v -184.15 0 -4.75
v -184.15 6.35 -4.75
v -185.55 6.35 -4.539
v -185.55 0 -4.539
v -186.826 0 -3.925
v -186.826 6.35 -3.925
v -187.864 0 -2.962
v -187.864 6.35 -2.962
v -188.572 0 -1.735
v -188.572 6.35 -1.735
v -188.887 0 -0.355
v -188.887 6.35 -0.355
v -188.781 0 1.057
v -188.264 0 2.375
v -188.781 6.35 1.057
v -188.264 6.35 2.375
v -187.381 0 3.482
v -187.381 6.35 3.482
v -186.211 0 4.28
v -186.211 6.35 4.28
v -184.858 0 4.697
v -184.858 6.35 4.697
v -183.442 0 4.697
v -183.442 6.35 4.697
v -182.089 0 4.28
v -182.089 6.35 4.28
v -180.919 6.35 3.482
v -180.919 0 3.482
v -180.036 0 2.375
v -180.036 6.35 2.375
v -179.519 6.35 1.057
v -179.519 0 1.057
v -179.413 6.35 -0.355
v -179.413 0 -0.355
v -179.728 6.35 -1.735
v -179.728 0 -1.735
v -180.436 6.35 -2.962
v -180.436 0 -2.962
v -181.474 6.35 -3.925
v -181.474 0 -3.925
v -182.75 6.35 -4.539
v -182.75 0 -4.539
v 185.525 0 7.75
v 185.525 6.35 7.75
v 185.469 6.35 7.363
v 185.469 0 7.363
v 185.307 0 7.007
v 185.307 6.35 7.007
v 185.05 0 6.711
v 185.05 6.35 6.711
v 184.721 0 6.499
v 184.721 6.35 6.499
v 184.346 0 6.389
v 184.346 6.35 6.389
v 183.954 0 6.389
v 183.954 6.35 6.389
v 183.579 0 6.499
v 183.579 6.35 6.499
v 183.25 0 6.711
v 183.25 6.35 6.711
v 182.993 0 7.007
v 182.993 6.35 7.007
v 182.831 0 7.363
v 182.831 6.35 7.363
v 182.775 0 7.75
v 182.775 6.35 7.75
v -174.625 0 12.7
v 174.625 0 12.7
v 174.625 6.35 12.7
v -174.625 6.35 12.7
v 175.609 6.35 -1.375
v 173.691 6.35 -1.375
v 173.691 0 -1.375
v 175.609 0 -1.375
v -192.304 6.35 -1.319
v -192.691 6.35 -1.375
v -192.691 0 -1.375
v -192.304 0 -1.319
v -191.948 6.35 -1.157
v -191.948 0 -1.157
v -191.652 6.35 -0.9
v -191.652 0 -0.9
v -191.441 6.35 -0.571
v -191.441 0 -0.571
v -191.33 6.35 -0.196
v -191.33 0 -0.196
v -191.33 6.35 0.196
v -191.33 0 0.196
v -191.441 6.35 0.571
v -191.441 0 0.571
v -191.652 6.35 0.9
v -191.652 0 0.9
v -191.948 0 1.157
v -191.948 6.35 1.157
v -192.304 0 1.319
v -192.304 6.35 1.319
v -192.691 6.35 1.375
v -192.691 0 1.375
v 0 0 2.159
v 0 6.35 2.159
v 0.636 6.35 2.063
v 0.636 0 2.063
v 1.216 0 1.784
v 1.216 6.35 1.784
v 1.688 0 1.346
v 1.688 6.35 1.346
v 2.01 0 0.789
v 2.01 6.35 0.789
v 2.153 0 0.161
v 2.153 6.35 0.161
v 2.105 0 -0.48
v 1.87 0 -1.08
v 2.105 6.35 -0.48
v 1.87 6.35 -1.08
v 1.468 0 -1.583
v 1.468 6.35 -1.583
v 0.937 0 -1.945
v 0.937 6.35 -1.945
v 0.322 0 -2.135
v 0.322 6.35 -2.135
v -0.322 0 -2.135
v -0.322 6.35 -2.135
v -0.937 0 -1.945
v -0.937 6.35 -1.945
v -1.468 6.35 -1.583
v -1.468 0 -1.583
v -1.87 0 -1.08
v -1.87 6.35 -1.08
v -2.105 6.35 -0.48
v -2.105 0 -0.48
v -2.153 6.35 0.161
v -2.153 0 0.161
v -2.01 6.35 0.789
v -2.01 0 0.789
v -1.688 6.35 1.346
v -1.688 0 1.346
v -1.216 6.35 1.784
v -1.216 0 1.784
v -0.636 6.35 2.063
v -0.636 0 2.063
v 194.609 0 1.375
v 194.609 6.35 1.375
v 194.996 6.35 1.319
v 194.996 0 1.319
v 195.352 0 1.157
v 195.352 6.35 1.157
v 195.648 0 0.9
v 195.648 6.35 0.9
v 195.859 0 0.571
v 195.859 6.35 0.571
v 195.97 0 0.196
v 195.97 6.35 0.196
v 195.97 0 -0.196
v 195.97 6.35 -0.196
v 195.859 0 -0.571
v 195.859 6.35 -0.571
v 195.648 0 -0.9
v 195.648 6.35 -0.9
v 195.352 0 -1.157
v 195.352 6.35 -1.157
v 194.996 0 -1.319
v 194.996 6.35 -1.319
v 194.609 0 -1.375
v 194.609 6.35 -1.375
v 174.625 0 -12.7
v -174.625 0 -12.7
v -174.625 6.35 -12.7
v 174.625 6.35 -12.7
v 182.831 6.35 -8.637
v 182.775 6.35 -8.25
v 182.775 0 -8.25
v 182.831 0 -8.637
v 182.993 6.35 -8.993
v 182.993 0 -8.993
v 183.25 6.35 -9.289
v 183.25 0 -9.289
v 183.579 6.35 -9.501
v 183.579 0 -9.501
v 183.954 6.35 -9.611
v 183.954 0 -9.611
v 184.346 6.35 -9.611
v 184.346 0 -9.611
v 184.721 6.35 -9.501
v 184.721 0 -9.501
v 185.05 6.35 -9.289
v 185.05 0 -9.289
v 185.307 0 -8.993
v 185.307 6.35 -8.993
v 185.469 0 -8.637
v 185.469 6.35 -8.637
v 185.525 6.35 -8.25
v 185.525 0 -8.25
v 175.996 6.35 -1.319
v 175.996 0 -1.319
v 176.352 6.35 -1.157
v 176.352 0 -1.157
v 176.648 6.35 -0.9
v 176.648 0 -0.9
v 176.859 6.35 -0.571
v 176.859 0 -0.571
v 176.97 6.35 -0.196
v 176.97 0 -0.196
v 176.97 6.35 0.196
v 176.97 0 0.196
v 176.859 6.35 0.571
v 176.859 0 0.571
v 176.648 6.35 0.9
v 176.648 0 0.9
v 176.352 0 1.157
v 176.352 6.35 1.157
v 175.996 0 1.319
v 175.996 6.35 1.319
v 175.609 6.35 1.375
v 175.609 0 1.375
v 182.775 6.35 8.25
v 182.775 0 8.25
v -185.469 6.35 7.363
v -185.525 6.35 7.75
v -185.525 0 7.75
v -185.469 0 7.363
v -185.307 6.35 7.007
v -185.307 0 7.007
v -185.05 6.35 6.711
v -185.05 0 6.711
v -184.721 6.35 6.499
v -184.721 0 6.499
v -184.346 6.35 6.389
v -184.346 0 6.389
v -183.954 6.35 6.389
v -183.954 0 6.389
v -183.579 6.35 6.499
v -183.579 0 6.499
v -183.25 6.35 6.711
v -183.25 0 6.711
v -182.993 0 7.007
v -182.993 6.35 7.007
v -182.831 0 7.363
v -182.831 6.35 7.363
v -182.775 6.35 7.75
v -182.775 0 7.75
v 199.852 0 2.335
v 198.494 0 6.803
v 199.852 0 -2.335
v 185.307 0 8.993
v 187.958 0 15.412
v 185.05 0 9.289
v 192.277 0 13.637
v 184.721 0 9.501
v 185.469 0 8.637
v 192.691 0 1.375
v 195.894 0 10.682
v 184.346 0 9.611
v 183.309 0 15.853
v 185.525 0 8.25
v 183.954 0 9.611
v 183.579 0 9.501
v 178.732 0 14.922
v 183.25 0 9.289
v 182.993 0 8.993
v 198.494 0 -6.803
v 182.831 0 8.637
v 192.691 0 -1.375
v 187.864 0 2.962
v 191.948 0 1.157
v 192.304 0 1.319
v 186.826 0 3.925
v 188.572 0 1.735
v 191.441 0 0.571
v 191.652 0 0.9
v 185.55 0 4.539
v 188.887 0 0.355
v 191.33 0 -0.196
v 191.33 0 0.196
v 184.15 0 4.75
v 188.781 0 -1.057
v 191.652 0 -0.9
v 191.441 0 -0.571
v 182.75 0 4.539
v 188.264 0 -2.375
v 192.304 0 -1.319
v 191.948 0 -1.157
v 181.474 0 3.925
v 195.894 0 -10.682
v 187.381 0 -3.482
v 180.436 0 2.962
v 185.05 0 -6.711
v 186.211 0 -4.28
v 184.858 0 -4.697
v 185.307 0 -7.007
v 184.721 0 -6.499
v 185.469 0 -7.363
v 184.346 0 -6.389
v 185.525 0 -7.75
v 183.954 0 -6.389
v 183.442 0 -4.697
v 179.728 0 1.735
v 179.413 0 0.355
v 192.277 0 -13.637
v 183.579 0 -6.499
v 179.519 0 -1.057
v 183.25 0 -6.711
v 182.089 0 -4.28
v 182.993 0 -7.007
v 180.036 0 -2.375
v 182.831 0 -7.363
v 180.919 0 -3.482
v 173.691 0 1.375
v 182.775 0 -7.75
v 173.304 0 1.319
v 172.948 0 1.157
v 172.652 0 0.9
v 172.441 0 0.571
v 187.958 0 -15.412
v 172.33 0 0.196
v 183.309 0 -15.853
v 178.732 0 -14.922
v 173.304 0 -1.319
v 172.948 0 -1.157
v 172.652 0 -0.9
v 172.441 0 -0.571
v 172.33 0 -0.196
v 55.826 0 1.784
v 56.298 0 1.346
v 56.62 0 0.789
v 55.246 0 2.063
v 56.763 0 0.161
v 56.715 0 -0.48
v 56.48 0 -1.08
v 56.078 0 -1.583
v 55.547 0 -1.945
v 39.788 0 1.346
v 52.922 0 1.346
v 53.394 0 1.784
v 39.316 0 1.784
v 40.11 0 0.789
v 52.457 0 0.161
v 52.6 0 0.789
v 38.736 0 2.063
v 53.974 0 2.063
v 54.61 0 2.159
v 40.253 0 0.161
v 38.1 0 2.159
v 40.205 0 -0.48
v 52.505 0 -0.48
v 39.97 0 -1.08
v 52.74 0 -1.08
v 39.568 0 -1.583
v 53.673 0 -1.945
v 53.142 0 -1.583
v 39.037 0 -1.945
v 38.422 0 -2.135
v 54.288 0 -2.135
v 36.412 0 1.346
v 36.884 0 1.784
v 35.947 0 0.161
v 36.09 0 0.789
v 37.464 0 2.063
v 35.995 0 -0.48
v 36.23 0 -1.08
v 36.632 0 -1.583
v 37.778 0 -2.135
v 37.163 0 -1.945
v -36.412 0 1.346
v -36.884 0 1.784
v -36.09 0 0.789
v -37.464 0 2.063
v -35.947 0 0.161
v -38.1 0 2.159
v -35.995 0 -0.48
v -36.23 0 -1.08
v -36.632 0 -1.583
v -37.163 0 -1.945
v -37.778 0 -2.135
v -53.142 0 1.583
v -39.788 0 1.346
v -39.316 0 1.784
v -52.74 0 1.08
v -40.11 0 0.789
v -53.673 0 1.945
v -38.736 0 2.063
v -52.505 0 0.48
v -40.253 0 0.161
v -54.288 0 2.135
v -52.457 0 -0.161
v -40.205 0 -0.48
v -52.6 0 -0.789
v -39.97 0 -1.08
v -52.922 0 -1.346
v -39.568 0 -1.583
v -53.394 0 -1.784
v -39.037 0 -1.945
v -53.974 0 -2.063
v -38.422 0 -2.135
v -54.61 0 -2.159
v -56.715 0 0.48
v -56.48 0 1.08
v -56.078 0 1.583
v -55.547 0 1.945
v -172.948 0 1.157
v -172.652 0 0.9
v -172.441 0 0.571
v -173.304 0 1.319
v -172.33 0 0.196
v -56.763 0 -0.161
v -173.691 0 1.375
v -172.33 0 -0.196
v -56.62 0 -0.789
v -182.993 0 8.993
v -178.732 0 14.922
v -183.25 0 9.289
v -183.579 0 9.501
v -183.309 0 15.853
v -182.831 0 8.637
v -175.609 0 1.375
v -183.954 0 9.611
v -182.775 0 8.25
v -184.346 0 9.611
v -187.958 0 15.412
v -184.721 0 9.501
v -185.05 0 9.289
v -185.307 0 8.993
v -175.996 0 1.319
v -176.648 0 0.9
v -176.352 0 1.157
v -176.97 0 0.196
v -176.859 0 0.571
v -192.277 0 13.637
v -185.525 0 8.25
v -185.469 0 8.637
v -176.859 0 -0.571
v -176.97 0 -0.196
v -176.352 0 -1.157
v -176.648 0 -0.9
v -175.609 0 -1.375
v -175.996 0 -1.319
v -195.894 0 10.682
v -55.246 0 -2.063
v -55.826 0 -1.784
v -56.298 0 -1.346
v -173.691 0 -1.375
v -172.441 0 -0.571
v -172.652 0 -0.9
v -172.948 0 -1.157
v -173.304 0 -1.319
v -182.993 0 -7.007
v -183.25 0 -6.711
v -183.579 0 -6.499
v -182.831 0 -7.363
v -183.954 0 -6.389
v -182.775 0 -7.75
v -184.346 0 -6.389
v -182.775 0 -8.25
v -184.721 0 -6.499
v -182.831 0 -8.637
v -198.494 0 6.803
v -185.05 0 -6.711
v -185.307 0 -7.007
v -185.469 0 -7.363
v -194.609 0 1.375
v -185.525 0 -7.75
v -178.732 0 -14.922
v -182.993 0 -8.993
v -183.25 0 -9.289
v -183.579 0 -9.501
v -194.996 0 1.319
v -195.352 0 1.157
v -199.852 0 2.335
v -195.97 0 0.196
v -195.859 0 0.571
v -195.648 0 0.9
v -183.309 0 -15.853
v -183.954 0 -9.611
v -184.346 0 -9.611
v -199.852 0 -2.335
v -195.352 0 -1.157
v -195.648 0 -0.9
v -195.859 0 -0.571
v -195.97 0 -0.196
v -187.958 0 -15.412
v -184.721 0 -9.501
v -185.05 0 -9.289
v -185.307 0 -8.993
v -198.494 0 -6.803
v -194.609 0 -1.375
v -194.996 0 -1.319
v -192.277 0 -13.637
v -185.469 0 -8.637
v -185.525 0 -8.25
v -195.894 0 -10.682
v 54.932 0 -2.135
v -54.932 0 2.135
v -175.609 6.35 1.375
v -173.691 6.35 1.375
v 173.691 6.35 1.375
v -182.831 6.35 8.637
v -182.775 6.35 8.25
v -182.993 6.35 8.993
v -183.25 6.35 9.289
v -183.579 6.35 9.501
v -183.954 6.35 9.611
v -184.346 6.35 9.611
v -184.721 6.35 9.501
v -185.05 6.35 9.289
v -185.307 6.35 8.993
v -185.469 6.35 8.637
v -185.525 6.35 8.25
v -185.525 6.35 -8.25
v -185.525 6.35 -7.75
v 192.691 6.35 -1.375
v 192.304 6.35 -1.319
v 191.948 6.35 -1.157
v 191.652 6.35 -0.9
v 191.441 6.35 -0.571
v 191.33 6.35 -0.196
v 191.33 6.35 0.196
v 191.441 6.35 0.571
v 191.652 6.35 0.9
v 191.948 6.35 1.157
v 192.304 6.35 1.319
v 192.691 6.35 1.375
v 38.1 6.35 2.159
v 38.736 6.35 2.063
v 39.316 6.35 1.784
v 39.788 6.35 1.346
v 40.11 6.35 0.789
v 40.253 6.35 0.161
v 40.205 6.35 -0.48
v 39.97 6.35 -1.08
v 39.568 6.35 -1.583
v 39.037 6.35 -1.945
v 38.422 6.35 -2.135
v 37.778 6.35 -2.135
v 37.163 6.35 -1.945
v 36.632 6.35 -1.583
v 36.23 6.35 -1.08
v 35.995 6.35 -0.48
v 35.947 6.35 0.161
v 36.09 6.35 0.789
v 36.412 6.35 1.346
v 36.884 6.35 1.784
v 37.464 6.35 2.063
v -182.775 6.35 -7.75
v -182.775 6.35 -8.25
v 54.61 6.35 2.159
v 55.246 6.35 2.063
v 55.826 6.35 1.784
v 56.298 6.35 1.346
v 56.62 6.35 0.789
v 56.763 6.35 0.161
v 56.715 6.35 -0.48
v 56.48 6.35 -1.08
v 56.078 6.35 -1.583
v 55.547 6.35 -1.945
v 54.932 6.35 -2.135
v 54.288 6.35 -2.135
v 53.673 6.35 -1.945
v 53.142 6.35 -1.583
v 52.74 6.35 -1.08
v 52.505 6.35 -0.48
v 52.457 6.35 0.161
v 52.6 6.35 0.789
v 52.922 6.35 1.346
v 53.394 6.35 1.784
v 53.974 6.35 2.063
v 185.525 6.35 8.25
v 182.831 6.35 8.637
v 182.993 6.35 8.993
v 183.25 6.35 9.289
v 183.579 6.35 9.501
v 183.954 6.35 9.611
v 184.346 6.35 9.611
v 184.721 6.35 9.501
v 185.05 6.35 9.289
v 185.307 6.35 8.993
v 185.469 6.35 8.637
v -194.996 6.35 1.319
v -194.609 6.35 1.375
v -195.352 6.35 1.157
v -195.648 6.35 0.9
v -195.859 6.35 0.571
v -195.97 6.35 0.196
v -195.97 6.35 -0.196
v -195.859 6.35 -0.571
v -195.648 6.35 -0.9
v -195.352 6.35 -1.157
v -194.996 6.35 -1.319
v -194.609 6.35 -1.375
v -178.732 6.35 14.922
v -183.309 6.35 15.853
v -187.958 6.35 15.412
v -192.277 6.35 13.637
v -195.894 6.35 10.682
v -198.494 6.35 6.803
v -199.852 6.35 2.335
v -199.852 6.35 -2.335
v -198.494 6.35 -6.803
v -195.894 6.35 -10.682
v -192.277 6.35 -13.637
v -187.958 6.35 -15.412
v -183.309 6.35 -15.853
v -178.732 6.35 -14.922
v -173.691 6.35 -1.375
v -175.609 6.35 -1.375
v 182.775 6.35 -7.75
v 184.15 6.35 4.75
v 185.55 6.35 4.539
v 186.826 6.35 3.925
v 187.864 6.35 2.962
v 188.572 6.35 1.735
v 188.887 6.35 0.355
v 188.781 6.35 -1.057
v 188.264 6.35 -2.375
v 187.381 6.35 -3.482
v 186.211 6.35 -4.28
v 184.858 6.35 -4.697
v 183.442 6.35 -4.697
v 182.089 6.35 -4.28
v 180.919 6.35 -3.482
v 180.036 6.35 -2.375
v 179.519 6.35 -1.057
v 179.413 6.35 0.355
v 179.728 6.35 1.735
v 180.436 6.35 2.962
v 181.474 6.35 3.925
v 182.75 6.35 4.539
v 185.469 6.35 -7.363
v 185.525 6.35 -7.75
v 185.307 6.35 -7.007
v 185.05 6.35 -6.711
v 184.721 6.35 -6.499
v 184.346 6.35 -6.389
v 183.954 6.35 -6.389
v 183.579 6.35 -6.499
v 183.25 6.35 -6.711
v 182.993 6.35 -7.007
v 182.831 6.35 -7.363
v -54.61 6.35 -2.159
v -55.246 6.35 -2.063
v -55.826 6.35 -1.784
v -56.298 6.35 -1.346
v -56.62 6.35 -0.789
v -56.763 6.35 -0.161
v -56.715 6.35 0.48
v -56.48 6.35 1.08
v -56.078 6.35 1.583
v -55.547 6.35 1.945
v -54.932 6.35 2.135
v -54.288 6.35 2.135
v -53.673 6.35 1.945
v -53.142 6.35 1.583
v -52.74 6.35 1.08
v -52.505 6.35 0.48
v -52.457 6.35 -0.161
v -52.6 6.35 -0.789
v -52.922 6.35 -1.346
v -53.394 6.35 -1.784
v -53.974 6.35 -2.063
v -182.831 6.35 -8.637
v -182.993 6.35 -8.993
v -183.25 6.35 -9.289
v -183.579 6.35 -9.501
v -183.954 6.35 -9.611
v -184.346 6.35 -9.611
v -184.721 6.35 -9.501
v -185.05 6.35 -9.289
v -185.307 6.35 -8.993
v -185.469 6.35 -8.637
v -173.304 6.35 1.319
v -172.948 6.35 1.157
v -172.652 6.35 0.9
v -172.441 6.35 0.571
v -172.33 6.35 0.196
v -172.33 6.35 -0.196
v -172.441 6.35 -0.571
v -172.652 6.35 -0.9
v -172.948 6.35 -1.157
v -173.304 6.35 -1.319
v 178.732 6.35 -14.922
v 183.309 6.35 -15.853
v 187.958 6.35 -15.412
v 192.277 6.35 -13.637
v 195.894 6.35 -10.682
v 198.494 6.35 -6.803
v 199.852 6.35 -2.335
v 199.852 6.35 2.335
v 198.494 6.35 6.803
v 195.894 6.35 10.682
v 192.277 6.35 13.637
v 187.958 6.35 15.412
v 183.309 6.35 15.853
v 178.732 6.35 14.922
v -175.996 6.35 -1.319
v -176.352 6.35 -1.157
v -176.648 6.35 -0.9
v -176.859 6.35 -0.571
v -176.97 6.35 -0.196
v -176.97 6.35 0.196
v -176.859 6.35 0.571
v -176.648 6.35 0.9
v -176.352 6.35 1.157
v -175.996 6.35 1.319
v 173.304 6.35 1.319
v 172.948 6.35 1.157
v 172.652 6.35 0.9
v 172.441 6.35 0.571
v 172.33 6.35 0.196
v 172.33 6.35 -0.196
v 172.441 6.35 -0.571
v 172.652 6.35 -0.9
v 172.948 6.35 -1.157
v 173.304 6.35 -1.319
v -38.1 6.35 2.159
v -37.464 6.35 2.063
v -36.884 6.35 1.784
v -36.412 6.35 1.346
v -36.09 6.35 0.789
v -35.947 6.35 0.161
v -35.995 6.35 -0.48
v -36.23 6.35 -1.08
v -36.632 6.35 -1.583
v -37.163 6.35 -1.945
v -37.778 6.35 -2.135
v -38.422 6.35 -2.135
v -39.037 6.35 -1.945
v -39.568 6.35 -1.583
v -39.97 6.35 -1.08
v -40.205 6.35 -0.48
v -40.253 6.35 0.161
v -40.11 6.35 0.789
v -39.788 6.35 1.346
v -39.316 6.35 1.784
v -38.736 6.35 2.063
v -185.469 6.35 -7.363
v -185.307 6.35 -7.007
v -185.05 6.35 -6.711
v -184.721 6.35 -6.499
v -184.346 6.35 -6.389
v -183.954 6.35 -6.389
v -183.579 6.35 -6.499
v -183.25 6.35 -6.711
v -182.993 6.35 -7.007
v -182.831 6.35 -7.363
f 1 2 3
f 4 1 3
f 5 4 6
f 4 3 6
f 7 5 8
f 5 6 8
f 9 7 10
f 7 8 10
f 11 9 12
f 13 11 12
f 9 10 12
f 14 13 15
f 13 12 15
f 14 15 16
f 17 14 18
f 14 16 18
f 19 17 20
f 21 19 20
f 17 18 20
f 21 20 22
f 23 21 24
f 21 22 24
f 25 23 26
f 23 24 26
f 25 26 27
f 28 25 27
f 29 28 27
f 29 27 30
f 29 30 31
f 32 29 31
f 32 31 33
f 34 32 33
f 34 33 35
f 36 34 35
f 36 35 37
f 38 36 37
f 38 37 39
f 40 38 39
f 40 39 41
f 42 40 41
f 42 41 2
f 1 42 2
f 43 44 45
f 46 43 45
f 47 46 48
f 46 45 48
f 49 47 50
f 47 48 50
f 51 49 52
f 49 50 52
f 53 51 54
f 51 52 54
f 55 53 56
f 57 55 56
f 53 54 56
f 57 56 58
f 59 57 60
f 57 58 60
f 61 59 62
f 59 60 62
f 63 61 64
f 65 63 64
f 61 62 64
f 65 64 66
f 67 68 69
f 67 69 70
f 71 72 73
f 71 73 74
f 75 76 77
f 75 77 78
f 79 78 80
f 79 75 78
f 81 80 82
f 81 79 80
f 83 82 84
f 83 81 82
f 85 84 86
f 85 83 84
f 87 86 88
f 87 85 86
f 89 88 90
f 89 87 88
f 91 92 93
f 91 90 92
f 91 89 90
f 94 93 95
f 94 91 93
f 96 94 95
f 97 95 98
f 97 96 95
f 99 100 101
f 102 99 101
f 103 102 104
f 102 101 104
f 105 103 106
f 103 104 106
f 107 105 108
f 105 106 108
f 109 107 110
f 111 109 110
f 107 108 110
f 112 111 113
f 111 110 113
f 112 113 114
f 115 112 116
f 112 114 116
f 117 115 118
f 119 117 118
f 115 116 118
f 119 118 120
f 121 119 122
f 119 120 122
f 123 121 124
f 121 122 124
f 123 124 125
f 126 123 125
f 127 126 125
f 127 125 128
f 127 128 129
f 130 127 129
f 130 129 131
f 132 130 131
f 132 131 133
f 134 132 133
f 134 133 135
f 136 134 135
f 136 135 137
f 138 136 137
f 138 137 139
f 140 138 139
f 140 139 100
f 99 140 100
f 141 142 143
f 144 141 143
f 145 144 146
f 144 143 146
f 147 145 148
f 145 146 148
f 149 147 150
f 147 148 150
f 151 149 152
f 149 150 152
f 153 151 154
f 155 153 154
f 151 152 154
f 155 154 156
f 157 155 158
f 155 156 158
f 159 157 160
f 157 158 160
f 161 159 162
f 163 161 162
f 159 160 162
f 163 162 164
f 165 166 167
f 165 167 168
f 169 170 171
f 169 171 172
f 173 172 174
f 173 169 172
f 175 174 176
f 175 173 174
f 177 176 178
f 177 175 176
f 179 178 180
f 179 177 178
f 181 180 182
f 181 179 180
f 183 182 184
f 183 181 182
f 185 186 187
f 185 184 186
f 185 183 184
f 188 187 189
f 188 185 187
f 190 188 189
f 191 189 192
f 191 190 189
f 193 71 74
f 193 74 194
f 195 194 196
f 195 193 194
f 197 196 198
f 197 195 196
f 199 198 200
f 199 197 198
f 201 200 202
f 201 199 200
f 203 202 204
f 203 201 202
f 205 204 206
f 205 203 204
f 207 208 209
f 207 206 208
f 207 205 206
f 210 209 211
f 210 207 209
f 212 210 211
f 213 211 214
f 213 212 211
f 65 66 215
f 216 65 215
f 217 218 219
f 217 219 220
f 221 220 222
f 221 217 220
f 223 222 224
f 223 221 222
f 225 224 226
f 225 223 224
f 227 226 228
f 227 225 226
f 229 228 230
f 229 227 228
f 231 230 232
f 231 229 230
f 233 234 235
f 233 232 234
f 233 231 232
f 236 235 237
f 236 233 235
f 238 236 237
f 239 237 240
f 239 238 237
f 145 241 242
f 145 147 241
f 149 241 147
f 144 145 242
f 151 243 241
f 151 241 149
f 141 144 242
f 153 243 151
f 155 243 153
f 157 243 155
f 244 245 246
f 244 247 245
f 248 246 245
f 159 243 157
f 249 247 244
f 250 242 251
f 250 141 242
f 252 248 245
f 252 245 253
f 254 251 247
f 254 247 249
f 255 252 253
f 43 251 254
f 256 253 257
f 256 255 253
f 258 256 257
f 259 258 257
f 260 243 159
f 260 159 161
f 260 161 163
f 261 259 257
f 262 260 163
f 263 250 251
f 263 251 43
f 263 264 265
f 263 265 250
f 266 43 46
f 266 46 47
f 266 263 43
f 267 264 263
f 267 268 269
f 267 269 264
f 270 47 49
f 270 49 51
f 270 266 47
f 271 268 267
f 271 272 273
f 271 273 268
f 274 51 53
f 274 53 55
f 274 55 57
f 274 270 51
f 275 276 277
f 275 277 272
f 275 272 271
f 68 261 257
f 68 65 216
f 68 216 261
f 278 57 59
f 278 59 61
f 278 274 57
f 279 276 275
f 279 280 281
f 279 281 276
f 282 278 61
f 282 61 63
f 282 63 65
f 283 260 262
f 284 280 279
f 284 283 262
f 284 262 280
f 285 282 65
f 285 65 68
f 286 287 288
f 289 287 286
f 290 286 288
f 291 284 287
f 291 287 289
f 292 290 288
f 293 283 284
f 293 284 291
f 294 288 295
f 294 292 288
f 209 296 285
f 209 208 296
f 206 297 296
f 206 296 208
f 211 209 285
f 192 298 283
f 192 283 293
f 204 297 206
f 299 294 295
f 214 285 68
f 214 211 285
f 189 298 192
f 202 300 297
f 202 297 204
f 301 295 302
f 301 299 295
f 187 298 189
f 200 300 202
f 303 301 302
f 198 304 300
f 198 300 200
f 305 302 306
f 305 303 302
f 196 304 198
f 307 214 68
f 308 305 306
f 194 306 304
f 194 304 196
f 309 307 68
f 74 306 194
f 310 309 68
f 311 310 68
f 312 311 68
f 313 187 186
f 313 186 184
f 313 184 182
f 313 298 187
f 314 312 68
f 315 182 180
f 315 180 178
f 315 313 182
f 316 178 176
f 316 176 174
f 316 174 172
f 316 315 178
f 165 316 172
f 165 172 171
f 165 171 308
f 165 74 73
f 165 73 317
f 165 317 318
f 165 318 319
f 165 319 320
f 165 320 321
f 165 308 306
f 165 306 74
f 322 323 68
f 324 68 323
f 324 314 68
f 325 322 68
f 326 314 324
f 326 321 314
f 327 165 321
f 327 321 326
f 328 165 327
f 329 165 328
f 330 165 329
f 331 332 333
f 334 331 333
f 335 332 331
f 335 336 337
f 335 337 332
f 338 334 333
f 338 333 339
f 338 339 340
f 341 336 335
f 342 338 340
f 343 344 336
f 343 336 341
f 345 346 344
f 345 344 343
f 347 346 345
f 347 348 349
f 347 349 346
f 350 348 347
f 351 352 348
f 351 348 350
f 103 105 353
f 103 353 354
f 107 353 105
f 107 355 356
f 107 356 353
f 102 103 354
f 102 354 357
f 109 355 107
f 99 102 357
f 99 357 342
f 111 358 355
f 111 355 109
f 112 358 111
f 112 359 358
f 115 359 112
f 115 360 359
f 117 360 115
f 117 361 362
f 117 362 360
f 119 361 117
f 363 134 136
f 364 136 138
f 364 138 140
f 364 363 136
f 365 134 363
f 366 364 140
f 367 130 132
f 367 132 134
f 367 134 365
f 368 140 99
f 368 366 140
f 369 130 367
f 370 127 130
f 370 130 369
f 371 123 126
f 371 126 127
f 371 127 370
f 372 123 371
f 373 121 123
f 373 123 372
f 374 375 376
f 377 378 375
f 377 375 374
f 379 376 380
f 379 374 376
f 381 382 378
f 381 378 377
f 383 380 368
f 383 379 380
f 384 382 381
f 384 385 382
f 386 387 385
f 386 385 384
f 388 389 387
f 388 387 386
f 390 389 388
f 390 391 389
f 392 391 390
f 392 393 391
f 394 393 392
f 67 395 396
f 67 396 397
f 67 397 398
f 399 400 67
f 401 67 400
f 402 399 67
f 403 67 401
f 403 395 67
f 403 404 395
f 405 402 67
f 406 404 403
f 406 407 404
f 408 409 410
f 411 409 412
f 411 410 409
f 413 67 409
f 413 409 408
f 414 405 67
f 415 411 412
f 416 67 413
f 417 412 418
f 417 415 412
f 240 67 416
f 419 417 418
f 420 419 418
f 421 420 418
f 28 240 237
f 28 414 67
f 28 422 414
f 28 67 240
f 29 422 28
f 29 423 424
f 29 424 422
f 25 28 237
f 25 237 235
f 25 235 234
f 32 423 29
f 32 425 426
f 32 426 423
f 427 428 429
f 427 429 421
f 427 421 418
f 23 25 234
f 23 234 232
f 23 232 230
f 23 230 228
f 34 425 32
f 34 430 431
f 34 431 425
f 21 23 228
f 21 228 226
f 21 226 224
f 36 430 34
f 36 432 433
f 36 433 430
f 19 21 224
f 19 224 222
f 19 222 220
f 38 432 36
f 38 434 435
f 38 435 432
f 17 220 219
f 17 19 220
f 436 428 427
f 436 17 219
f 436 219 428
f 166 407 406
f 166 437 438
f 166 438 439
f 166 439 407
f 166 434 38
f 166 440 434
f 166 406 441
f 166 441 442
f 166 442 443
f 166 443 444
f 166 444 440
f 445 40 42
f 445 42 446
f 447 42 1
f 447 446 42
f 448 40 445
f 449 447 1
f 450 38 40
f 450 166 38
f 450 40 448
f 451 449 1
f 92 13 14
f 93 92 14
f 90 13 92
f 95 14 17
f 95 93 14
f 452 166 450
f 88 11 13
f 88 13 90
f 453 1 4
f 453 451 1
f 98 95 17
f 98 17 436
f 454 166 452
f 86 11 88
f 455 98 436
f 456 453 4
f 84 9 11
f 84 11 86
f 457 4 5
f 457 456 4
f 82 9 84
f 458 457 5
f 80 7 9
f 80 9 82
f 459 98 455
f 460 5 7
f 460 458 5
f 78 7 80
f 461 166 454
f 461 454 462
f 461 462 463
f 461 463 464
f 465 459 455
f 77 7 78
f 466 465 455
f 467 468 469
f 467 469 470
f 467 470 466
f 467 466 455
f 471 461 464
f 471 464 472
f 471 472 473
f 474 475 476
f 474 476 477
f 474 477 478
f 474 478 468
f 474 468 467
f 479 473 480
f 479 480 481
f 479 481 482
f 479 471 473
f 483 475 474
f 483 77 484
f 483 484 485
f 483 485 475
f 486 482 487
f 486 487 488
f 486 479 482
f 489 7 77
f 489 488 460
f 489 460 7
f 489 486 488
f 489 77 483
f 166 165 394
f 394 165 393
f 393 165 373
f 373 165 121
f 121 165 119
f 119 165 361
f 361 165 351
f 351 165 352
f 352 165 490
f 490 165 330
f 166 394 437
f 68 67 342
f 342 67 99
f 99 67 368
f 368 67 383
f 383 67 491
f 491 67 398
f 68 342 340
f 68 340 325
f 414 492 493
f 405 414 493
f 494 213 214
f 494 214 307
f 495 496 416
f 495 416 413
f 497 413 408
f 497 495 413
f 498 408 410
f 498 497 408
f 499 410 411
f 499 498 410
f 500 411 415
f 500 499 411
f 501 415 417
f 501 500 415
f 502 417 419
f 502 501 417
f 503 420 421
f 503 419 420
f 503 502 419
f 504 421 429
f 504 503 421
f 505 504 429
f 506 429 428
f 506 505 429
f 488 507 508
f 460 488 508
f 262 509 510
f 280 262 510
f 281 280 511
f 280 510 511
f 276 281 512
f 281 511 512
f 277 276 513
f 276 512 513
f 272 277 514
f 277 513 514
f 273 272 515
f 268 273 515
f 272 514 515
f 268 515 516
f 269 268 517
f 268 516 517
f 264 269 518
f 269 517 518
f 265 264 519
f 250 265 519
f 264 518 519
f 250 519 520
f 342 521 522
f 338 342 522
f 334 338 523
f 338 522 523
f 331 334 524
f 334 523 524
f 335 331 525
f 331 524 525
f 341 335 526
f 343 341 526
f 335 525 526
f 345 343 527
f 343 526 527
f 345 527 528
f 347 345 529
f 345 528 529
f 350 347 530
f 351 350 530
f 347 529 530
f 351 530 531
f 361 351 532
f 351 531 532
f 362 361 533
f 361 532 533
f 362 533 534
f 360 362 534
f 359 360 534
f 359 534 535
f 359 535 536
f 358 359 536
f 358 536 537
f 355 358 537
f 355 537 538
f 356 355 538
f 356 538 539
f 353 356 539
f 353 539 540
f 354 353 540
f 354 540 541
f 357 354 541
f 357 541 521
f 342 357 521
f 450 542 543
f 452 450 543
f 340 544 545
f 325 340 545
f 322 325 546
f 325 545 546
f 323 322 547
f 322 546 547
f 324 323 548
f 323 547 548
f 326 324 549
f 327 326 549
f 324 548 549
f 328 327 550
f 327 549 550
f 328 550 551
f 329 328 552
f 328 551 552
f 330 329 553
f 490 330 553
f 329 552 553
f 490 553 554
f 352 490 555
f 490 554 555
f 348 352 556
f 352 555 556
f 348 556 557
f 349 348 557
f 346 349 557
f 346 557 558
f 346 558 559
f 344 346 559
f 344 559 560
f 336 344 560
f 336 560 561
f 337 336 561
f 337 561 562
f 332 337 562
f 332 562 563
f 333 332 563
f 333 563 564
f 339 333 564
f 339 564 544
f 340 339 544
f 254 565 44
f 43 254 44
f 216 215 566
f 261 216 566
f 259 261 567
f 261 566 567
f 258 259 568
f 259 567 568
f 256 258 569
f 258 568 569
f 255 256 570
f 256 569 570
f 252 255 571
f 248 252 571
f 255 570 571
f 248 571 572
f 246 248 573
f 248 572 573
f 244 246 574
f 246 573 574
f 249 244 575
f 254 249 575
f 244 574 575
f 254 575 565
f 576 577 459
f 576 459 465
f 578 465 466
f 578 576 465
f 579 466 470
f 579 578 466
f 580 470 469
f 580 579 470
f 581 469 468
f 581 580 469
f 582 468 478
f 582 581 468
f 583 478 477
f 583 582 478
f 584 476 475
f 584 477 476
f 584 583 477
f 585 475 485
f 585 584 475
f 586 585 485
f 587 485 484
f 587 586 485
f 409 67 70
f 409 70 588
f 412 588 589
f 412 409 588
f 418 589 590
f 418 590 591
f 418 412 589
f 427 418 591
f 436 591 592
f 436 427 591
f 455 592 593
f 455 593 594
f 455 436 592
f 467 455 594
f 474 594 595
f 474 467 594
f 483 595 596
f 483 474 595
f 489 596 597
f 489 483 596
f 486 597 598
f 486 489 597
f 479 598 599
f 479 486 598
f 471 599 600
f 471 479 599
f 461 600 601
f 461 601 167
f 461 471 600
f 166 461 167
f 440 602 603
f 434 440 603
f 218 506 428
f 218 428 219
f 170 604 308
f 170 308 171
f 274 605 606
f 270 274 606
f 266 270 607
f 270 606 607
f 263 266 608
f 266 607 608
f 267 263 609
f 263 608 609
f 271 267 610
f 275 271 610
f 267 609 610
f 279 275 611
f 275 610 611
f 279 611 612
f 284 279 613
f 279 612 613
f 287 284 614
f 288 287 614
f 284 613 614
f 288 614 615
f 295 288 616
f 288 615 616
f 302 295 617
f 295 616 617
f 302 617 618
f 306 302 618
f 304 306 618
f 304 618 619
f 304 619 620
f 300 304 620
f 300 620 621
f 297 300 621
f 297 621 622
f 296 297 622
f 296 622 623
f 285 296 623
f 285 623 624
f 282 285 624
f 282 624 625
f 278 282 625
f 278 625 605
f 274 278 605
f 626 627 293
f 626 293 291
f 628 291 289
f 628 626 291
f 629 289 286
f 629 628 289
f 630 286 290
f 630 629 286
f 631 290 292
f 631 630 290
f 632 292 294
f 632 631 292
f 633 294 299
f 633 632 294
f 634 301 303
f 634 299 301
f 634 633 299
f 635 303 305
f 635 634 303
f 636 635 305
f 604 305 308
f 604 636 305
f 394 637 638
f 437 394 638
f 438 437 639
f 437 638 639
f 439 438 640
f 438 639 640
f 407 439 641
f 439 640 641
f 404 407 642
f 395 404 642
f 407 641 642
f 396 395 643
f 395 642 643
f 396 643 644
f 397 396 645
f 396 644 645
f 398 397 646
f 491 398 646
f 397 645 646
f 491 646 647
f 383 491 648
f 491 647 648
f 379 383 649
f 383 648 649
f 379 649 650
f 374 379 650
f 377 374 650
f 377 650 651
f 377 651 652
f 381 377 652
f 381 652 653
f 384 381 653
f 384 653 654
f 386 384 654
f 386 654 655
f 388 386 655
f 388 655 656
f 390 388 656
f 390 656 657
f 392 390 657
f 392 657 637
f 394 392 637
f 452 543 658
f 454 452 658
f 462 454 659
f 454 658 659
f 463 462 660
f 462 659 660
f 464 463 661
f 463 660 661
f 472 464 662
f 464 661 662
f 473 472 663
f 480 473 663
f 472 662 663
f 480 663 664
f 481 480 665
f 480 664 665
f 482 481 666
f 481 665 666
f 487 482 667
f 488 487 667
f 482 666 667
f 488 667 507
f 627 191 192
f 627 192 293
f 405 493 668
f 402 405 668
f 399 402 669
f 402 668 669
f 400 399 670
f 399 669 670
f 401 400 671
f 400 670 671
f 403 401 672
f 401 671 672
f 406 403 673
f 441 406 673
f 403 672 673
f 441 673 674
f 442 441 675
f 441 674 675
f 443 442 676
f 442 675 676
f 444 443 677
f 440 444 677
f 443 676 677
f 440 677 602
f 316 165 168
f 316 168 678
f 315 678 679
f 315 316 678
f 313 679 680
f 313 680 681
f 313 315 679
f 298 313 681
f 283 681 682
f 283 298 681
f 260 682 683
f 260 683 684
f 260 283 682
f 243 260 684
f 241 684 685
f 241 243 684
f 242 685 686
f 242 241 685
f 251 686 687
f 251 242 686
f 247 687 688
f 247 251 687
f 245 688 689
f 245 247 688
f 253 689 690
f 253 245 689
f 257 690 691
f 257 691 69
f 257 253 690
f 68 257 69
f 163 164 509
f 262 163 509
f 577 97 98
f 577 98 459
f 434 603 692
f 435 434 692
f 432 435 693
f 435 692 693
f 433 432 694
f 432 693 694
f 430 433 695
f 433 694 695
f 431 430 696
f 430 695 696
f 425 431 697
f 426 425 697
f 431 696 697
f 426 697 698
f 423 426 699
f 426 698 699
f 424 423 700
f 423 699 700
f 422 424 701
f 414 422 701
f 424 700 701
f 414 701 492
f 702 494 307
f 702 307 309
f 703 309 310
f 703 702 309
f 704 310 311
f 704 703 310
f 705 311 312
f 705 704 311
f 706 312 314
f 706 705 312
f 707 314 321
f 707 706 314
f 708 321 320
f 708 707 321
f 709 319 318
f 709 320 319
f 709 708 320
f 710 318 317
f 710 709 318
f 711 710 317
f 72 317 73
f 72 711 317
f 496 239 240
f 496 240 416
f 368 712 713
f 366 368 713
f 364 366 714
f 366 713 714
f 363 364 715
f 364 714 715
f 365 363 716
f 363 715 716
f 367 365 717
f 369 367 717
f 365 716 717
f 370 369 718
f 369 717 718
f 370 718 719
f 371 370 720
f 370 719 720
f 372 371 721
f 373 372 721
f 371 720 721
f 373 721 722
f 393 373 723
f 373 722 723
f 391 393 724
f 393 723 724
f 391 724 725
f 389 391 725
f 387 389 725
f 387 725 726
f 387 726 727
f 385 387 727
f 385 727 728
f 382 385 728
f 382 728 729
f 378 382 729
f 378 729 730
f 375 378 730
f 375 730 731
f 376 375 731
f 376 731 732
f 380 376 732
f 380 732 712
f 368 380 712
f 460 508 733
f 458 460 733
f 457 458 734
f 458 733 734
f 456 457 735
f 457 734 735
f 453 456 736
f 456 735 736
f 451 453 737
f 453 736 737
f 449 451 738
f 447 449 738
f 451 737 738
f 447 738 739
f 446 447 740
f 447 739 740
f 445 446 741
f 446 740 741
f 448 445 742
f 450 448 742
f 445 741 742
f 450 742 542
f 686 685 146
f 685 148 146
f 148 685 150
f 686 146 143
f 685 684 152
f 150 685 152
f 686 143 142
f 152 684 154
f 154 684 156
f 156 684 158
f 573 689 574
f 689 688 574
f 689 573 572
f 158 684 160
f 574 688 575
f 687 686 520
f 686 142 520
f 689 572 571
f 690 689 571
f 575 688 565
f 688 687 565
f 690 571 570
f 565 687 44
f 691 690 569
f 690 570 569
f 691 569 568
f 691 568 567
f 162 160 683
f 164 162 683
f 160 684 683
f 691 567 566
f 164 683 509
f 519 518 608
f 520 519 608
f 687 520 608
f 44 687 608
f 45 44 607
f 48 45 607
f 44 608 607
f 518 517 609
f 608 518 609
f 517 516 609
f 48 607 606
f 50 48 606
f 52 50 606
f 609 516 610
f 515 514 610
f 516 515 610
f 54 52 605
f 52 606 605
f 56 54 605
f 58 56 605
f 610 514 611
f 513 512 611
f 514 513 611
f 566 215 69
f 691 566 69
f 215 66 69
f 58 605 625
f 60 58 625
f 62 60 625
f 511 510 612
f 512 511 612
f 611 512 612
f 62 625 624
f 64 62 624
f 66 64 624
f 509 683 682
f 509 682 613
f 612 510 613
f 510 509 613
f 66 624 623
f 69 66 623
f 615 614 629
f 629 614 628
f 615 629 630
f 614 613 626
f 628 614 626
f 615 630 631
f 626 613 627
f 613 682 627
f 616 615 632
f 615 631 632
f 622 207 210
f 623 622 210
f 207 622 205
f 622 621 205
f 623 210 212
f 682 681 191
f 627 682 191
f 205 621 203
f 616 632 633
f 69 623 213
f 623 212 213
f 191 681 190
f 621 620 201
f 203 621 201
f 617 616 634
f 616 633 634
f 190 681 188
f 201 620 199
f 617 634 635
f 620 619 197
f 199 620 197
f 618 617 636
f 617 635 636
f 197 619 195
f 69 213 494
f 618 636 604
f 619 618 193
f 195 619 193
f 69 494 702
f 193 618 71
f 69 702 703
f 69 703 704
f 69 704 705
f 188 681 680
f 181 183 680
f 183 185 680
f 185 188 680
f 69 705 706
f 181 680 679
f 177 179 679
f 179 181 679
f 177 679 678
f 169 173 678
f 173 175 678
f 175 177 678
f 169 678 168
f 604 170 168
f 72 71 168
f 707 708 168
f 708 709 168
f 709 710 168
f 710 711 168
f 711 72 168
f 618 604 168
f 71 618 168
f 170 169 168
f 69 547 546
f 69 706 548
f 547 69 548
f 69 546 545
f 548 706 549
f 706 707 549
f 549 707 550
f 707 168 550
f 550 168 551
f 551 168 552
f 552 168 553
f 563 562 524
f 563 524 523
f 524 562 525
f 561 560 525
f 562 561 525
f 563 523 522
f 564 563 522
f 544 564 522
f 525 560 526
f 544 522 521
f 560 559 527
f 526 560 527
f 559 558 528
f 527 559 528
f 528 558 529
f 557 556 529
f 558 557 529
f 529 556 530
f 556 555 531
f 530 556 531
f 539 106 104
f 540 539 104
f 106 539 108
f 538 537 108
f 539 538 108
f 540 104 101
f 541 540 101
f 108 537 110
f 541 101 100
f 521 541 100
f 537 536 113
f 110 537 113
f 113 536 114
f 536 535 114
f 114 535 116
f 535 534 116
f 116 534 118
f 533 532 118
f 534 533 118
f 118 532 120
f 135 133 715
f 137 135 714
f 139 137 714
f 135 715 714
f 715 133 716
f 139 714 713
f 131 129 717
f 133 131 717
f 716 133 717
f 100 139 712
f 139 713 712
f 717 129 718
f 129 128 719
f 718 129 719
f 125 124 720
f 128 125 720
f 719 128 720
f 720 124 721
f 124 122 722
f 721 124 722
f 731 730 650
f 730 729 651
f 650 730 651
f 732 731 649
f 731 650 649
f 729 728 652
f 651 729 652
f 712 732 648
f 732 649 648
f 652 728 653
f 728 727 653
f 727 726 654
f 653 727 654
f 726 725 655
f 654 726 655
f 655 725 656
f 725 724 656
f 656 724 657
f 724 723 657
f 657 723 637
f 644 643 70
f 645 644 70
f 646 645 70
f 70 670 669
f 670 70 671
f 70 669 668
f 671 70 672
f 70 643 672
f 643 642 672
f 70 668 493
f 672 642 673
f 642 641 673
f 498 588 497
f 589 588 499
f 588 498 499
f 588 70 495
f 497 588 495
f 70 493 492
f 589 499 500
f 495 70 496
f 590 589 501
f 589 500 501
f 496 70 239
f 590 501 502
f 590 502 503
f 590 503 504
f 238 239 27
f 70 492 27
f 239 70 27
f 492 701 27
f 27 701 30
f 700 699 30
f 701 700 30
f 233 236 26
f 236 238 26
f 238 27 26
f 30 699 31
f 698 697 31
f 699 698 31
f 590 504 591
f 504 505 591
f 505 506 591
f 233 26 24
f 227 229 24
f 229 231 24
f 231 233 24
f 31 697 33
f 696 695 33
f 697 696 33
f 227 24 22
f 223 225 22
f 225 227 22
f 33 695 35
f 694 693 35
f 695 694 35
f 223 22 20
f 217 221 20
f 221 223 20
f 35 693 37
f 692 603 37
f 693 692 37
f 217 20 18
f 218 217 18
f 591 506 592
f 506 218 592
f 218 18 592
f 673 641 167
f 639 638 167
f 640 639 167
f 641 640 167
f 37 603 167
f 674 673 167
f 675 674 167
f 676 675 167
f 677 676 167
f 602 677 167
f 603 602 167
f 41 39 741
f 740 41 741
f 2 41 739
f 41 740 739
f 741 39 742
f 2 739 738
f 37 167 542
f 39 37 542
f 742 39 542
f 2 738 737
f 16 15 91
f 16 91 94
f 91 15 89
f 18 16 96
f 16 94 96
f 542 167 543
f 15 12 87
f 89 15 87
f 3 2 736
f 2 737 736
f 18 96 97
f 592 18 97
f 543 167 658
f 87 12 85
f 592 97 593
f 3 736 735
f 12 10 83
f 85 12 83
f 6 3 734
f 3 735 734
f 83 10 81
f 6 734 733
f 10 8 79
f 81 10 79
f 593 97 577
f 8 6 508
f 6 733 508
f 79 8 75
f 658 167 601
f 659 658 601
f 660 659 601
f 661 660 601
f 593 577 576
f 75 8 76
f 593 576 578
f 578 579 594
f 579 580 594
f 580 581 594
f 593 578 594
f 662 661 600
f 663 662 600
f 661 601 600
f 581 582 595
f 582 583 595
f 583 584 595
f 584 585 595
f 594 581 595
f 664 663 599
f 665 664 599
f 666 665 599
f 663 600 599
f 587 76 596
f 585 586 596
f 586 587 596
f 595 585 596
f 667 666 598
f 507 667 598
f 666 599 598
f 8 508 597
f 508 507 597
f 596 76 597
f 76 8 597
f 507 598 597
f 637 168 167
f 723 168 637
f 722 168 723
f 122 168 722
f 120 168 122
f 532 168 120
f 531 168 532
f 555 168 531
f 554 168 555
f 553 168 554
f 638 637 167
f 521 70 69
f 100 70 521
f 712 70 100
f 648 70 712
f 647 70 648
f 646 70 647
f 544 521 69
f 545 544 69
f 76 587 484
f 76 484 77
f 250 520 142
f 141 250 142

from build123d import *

# Parameters (mm, degrees)
BOSS_EXTRUDE1_DEPTH = 6.35
SKETCH2_R           = 4.75
CUT_EXTRUDE1_DEPTH  = 201.754423986
SKETCH3_R           = 2.159
CUT_EXTRUDE2_DEPTH  = 201.754423986
SKETCH4_R           = 2.159
CUT_EXTRUDE3_DEPTH  = 201.754423986


with BuildPart() as part:
    # Sketch1 → Boss-Extrude1 (new body)
    with BuildSketch(Plane(origin=(0, 0, 0), x_dir=(1, 0, 0), z_dir=(0, 1, 0))):
        with BuildLine():
            Line((-174.625, 12.7), (174.625, 12.7))
            ThreePointArc((174.625, 12.7), (200.025, 0), (174.625, -12.7))
            Line((174.625, -12.7), (-174.625, -12.7))
            ThreePointArc((-174.625, -12.7), (-200.025, 0), (-174.625, 12.7))
        make_face()
    extrude(amount=BOSS_EXTRUDE1_DEPTH)

    # Sketch2 → Cut-Extrude1 (cut, through all)
    with BuildSketch(Plane(origin=(0, 6.35, 0), x_dir=(1, 0, 0), z_dir=(0, 1, 0))):
        with Locations(Location((184.15, 0, 0), (0, 0, 270))):
            Circle(SKETCH2_R)
        with Locations(Location((-184.15, 0, 0), (0, 0, 90))):
            Circle(SKETCH2_R)
        with BuildLine():
            Line((173.691383345, 1.375), (175.608616655, 1.375))
            ThreePointArc((175.608616655, 1.375), (176.983616655, 0), (175.608616655, -1.375))
            Line((175.608616655, -1.375), (173.691383345, -1.375))
            ThreePointArc((173.691383345, -1.375), (172.316383345, 0), (173.691383345, 1.375))
        make_face()
        with BuildLine():
            Line((194.608616655, 1.375), (192.691383345, 1.375))
            ThreePointArc((192.691383345, 1.375), (191.316383345, 0), (192.691383345, -1.375))
            Line((192.691383345, -1.375), (194.608616655, -1.375))
            ThreePointArc((194.608616655, -1.375), (195.983616655, 0), (194.608616655, 1.375))
        make_face()
        with BuildLine():
            Line((185.525, 8.25), (185.525, 7.75))
            ThreePointArc((185.525, 7.75), (184.15, 6.375), (182.775, 7.75))
            Line((182.775, 7.75), (182.775, 8.25))
            ThreePointArc((182.775, 8.25), (184.15, 9.625), (185.525, 8.25))
        make_face()
        with BuildLine():
            Line((185.525, -8.25), (185.525, -7.75))
            ThreePointArc((185.525, -7.75), (184.15, -6.375), (182.775, -7.75))
            Line((182.775, -7.75), (182.775, -8.25))
            ThreePointArc((182.775, -8.25), (184.15, -9.625), (185.525, -8.25))
        make_face()
        with BuildLine():
            Line((-185.525, -8.25), (-185.525, -7.75))
            ThreePointArc((-185.525, -7.75), (-184.15, -6.375), (-182.775, -7.75))
            Line((-182.775, -7.75), (-182.775, -8.25))
            ThreePointArc((-182.775, -8.25), (-184.15, -9.625), (-185.525, -8.25))
        make_face()
        with BuildLine():
            Line((-185.525, 8.25), (-185.525, 7.75))
            ThreePointArc((-185.525, 7.75), (-184.15, 6.375), (-182.775, 7.75))
            Line((-182.775, 7.75), (-182.775, 8.25))
            ThreePointArc((-182.775, 8.25), (-184.15, 9.625), (-185.525, 8.25))
        make_face()
        with BuildLine():
            Line((-194.608616655, 1.375), (-192.691383345, 1.375))
            ThreePointArc((-192.691383345, 1.375), (-191.316383345, 0), (-192.691383345, -1.375))
            Line((-192.691383345, -1.375), (-194.608616655, -1.375))
            ThreePointArc((-194.608616655, -1.375), (-195.983616655, 0), (-194.608616655, 1.375))
        make_face()
        with BuildLine():
            Line((-173.691383345, 1.375), (-175.608616655, 1.375))
            ThreePointArc((-175.608616655, 1.375), (-176.983616655, 0), (-175.608616655, -1.375))
            Line((-175.608616655, -1.375), (-173.691383345, -1.375))
            ThreePointArc((-173.691383345, -1.375), (-172.316383345, 0), (-173.691383345, 1.375))
        make_face()
    extrude(amount=-CUT_EXTRUDE1_DEPTH, mode=Mode.SUBTRACT)

    # Sketch3 → Cut-Extrude2 (cut, through all)
    with BuildSketch(Plane(origin=(0, 6.35, 0), x_dir=(1, 0, 0), z_dir=(0, 1, 0))):
        with Locations(Location((0, 0, 0), (0, 0, 270))):
            Circle(SKETCH3_R)
        with Locations(Location((38.1, 0, 0), (0, 0, 270))):
            Circle(SKETCH3_R)
        with Locations(Location((-38.1, 0, 0), (0, 0, 270))):
            Circle(SKETCH3_R)
    extrude(amount=-CUT_EXTRUDE2_DEPTH, mode=Mode.SUBTRACT)

    # Sketch4 → Cut-Extrude3 (cut, through all)
    with BuildSketch(Plane(origin=(0, 6.35, 0), x_dir=(1, 0, 0), z_dir=(0, 1, 0))):
        with Locations(Location((54.61, 0, 0), (0, 0, 270))):
            Circle(SKETCH4_R)
        with Locations(Location((-54.61, 0, 0), (0, 0, 90))):
            Circle(SKETCH4_R)
    extrude(amount=-CUT_EXTRUDE3_DEPTH, mode=Mode.SUBTRACT)


solid = part.part
